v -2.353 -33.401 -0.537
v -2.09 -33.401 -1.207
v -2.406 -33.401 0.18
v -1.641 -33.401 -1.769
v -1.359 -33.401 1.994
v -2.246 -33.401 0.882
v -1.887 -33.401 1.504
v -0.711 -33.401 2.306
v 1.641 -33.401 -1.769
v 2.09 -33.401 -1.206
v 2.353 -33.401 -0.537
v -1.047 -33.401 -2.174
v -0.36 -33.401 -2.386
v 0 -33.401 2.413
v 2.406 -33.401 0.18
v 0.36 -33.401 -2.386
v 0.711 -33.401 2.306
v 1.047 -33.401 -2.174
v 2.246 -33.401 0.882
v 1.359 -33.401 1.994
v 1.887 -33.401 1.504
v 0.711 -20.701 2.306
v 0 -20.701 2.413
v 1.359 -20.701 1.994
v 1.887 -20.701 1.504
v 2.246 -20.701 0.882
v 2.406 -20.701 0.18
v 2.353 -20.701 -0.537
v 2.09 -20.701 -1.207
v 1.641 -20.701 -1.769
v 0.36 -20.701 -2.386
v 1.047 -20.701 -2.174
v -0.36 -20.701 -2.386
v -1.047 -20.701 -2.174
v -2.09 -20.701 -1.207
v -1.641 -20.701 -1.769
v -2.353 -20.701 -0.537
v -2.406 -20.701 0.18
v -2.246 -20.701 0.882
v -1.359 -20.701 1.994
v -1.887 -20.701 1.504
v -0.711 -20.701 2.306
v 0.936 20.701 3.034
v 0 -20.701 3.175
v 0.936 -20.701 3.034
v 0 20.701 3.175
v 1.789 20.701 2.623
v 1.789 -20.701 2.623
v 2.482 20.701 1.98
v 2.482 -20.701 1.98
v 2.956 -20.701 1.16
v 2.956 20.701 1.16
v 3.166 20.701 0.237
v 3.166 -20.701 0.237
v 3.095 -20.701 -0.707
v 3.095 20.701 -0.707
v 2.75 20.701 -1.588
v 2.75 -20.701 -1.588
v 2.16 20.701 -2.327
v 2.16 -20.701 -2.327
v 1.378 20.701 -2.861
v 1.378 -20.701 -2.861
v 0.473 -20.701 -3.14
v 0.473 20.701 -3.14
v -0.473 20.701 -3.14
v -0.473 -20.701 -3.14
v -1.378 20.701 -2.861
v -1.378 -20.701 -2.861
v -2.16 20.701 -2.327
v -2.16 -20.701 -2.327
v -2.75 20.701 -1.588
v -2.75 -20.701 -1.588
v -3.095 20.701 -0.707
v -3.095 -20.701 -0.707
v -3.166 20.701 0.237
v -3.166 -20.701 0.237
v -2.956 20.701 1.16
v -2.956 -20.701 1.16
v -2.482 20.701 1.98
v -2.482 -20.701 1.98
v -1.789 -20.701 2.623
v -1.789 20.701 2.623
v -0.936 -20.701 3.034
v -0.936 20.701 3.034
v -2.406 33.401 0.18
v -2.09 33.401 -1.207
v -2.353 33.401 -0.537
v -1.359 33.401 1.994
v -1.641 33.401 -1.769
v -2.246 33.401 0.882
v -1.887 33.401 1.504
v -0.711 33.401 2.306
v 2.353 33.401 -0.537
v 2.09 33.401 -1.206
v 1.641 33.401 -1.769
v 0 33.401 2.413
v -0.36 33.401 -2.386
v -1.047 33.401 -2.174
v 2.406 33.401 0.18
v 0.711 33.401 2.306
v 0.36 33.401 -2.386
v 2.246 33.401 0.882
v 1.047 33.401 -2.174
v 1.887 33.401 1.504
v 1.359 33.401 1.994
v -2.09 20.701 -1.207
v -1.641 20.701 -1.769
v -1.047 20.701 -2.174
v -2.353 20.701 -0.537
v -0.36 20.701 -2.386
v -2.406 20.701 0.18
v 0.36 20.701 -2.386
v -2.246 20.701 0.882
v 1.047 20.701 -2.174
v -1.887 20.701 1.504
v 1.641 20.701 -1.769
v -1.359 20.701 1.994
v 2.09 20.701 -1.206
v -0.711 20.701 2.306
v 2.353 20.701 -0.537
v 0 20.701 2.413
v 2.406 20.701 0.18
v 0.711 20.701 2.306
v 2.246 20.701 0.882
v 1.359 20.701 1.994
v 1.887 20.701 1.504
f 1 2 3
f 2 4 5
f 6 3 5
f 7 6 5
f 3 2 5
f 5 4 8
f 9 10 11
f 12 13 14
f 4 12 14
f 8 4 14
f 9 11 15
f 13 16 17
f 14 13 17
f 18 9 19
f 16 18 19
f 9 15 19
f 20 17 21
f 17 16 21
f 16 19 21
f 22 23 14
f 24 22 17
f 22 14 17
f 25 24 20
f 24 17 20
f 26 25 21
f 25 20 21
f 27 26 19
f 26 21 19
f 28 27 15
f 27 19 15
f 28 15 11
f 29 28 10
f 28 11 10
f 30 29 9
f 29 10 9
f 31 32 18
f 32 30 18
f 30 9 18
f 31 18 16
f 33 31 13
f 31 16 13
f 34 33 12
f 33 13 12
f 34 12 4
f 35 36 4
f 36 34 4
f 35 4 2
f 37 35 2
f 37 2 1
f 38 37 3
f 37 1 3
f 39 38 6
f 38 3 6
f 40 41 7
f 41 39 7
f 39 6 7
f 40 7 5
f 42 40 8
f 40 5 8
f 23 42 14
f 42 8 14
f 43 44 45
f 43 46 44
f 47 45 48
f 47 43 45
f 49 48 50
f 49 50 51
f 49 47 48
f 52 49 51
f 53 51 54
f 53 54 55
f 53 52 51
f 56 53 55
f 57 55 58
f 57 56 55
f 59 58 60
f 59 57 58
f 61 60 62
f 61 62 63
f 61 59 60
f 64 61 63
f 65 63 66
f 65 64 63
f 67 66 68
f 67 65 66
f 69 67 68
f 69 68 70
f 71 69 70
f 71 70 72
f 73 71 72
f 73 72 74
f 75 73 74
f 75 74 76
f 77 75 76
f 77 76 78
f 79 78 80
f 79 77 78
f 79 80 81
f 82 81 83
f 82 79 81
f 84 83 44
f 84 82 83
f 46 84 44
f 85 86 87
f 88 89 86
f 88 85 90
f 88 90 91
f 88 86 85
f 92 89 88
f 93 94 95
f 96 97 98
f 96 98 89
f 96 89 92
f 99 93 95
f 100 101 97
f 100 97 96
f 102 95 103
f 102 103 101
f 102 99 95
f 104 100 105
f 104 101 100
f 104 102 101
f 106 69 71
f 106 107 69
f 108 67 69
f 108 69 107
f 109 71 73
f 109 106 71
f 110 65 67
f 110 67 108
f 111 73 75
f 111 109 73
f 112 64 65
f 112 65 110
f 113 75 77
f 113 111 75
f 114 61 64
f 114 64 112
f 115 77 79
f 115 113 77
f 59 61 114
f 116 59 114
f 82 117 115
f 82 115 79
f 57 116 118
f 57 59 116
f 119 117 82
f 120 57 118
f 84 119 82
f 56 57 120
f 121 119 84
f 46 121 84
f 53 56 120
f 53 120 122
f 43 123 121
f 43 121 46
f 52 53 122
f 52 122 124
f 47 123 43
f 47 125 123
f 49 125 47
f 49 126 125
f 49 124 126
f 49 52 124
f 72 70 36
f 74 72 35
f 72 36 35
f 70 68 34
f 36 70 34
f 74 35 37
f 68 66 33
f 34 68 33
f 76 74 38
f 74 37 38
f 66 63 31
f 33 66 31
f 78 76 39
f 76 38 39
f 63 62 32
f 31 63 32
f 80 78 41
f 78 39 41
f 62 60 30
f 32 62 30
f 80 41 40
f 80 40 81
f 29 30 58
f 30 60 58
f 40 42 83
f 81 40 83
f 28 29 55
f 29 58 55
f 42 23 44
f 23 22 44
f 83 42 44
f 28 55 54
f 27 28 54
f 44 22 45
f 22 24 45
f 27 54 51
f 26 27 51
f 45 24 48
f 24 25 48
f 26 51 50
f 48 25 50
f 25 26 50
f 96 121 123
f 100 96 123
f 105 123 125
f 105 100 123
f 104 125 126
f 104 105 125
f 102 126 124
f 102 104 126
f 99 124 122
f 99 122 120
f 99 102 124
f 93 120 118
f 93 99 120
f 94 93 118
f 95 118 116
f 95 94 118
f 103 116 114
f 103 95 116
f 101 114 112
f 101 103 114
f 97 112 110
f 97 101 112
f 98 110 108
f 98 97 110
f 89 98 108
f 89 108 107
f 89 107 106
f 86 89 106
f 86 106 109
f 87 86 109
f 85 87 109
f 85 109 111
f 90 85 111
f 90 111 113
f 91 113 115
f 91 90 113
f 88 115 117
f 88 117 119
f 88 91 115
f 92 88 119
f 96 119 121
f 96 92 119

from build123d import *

# Parameters (mm, degrees)
SKETCH2_R           = 3.175
BOSS_EXTRUDE1_DEPTH = 20.701
SKETCH3_R           = 2.413
BOSS_EXTRUDE2_DEPTH = 12.7


with BuildPart() as part:
    # Sketch2 → Boss-Extrude1 (new, symmetric)
    with BuildSketch(Plane(origin=(0, 0, 0), x_dir=(1, 0, 0), z_dir=(0, 1, 0))):
        with Locations(Location((0, 0, 0), (0, 0, 270))):
            Circle(SKETCH2_R)
    extrude(amount=BOSS_EXTRUDE1_DEPTH, both=True)

    # Sketch3 → Boss-Extrude2 (add, symmetric)
    with BuildSketch(Plane(origin=(0, 20.701, 0), x_dir=(1, 0, 0), z_dir=(0, 1, 0))):
        with Locations(Location((0, 0, 0), (0, 0, 270))):
            Circle(SKETCH3_R)
    boss_extrude2 = extrude(amount=BOSS_EXTRUDE2_DEPTH, both=True)

    # Mirror1: Boss-Extrude2 across plane
    add(boss_extrude2.mirror(Plane.ZX))


solid = part.part
